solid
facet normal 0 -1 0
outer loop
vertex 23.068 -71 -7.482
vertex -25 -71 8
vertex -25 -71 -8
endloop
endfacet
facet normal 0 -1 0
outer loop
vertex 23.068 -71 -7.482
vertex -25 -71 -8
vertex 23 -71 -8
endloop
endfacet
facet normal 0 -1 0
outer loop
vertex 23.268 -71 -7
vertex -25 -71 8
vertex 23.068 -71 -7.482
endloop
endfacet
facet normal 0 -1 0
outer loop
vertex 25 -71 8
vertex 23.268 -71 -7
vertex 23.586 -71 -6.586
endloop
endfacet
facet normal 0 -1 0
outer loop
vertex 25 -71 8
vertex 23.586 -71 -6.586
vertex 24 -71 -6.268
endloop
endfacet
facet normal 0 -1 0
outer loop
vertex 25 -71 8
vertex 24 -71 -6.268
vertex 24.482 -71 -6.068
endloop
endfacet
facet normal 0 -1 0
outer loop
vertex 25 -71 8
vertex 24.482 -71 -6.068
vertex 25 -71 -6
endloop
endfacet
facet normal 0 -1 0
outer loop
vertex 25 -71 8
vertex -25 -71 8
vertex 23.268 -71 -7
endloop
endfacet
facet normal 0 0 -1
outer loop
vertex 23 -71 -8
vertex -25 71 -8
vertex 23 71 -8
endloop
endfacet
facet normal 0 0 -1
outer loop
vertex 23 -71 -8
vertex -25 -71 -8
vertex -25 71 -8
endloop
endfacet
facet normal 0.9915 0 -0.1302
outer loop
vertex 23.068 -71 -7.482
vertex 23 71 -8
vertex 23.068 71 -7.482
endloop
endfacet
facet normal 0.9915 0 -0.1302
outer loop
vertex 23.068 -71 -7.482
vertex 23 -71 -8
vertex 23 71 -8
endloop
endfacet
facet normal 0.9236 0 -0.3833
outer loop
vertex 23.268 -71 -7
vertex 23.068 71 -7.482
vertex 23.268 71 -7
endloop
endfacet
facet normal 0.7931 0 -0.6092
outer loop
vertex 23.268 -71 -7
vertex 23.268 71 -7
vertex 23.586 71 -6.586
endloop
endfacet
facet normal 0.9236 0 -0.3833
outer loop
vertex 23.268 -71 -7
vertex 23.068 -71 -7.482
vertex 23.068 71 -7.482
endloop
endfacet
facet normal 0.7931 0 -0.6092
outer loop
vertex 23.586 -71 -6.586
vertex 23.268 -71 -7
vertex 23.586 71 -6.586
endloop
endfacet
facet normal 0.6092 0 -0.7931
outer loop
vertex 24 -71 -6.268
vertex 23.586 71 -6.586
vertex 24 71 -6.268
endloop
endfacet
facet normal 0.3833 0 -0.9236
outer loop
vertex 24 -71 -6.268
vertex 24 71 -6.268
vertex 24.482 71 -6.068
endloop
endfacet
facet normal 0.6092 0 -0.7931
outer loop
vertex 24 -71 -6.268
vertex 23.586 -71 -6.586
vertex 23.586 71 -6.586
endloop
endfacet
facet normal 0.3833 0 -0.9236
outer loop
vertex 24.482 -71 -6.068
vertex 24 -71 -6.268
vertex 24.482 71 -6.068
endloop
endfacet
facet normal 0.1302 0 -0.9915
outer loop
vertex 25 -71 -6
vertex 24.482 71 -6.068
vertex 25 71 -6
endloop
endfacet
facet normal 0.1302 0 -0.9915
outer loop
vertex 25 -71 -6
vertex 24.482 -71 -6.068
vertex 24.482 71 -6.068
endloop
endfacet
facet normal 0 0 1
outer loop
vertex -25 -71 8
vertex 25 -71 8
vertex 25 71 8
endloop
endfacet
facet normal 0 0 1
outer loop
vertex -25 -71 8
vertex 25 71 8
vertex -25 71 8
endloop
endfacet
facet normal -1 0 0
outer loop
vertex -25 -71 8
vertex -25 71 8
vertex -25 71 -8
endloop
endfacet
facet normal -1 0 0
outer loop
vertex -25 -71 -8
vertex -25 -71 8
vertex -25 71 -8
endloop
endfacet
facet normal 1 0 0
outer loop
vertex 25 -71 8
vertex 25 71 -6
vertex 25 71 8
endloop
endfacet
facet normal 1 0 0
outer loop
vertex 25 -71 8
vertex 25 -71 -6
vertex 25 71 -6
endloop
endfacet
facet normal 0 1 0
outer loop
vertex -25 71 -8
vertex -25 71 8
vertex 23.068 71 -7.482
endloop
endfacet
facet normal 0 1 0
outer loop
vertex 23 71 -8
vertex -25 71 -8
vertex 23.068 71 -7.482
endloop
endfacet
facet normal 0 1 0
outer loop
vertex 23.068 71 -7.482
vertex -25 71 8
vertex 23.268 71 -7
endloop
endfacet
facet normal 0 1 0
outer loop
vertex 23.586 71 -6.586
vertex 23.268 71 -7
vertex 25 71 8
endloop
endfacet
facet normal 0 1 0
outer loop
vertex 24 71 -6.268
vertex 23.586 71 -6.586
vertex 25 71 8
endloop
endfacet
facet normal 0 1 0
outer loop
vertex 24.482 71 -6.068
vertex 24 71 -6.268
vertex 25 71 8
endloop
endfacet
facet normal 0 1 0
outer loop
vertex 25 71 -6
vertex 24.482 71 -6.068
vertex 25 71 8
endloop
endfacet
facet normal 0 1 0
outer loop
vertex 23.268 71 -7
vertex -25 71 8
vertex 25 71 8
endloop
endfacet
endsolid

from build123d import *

# Parameters (mm, degrees)
F1_DEPTH = 71


with BuildPart() as f1:
    # F0 (on Front) → F1 (new body, symmetric)
    with BuildSketch(Plane.XZ):
        with BuildLine():
            Line((25, -6), (25, 8))
            Line((25, 8), (-25, 8))
            Line((-25, 8), (-25, -8))
            Line((-25, -8), (23, -8))
            ThreePointArc((23, -8), (23.585786, -6.585786), (25, -6))
        make_face()
    extrude(amount=F1_DEPTH, both=True)


solid = f1.part
